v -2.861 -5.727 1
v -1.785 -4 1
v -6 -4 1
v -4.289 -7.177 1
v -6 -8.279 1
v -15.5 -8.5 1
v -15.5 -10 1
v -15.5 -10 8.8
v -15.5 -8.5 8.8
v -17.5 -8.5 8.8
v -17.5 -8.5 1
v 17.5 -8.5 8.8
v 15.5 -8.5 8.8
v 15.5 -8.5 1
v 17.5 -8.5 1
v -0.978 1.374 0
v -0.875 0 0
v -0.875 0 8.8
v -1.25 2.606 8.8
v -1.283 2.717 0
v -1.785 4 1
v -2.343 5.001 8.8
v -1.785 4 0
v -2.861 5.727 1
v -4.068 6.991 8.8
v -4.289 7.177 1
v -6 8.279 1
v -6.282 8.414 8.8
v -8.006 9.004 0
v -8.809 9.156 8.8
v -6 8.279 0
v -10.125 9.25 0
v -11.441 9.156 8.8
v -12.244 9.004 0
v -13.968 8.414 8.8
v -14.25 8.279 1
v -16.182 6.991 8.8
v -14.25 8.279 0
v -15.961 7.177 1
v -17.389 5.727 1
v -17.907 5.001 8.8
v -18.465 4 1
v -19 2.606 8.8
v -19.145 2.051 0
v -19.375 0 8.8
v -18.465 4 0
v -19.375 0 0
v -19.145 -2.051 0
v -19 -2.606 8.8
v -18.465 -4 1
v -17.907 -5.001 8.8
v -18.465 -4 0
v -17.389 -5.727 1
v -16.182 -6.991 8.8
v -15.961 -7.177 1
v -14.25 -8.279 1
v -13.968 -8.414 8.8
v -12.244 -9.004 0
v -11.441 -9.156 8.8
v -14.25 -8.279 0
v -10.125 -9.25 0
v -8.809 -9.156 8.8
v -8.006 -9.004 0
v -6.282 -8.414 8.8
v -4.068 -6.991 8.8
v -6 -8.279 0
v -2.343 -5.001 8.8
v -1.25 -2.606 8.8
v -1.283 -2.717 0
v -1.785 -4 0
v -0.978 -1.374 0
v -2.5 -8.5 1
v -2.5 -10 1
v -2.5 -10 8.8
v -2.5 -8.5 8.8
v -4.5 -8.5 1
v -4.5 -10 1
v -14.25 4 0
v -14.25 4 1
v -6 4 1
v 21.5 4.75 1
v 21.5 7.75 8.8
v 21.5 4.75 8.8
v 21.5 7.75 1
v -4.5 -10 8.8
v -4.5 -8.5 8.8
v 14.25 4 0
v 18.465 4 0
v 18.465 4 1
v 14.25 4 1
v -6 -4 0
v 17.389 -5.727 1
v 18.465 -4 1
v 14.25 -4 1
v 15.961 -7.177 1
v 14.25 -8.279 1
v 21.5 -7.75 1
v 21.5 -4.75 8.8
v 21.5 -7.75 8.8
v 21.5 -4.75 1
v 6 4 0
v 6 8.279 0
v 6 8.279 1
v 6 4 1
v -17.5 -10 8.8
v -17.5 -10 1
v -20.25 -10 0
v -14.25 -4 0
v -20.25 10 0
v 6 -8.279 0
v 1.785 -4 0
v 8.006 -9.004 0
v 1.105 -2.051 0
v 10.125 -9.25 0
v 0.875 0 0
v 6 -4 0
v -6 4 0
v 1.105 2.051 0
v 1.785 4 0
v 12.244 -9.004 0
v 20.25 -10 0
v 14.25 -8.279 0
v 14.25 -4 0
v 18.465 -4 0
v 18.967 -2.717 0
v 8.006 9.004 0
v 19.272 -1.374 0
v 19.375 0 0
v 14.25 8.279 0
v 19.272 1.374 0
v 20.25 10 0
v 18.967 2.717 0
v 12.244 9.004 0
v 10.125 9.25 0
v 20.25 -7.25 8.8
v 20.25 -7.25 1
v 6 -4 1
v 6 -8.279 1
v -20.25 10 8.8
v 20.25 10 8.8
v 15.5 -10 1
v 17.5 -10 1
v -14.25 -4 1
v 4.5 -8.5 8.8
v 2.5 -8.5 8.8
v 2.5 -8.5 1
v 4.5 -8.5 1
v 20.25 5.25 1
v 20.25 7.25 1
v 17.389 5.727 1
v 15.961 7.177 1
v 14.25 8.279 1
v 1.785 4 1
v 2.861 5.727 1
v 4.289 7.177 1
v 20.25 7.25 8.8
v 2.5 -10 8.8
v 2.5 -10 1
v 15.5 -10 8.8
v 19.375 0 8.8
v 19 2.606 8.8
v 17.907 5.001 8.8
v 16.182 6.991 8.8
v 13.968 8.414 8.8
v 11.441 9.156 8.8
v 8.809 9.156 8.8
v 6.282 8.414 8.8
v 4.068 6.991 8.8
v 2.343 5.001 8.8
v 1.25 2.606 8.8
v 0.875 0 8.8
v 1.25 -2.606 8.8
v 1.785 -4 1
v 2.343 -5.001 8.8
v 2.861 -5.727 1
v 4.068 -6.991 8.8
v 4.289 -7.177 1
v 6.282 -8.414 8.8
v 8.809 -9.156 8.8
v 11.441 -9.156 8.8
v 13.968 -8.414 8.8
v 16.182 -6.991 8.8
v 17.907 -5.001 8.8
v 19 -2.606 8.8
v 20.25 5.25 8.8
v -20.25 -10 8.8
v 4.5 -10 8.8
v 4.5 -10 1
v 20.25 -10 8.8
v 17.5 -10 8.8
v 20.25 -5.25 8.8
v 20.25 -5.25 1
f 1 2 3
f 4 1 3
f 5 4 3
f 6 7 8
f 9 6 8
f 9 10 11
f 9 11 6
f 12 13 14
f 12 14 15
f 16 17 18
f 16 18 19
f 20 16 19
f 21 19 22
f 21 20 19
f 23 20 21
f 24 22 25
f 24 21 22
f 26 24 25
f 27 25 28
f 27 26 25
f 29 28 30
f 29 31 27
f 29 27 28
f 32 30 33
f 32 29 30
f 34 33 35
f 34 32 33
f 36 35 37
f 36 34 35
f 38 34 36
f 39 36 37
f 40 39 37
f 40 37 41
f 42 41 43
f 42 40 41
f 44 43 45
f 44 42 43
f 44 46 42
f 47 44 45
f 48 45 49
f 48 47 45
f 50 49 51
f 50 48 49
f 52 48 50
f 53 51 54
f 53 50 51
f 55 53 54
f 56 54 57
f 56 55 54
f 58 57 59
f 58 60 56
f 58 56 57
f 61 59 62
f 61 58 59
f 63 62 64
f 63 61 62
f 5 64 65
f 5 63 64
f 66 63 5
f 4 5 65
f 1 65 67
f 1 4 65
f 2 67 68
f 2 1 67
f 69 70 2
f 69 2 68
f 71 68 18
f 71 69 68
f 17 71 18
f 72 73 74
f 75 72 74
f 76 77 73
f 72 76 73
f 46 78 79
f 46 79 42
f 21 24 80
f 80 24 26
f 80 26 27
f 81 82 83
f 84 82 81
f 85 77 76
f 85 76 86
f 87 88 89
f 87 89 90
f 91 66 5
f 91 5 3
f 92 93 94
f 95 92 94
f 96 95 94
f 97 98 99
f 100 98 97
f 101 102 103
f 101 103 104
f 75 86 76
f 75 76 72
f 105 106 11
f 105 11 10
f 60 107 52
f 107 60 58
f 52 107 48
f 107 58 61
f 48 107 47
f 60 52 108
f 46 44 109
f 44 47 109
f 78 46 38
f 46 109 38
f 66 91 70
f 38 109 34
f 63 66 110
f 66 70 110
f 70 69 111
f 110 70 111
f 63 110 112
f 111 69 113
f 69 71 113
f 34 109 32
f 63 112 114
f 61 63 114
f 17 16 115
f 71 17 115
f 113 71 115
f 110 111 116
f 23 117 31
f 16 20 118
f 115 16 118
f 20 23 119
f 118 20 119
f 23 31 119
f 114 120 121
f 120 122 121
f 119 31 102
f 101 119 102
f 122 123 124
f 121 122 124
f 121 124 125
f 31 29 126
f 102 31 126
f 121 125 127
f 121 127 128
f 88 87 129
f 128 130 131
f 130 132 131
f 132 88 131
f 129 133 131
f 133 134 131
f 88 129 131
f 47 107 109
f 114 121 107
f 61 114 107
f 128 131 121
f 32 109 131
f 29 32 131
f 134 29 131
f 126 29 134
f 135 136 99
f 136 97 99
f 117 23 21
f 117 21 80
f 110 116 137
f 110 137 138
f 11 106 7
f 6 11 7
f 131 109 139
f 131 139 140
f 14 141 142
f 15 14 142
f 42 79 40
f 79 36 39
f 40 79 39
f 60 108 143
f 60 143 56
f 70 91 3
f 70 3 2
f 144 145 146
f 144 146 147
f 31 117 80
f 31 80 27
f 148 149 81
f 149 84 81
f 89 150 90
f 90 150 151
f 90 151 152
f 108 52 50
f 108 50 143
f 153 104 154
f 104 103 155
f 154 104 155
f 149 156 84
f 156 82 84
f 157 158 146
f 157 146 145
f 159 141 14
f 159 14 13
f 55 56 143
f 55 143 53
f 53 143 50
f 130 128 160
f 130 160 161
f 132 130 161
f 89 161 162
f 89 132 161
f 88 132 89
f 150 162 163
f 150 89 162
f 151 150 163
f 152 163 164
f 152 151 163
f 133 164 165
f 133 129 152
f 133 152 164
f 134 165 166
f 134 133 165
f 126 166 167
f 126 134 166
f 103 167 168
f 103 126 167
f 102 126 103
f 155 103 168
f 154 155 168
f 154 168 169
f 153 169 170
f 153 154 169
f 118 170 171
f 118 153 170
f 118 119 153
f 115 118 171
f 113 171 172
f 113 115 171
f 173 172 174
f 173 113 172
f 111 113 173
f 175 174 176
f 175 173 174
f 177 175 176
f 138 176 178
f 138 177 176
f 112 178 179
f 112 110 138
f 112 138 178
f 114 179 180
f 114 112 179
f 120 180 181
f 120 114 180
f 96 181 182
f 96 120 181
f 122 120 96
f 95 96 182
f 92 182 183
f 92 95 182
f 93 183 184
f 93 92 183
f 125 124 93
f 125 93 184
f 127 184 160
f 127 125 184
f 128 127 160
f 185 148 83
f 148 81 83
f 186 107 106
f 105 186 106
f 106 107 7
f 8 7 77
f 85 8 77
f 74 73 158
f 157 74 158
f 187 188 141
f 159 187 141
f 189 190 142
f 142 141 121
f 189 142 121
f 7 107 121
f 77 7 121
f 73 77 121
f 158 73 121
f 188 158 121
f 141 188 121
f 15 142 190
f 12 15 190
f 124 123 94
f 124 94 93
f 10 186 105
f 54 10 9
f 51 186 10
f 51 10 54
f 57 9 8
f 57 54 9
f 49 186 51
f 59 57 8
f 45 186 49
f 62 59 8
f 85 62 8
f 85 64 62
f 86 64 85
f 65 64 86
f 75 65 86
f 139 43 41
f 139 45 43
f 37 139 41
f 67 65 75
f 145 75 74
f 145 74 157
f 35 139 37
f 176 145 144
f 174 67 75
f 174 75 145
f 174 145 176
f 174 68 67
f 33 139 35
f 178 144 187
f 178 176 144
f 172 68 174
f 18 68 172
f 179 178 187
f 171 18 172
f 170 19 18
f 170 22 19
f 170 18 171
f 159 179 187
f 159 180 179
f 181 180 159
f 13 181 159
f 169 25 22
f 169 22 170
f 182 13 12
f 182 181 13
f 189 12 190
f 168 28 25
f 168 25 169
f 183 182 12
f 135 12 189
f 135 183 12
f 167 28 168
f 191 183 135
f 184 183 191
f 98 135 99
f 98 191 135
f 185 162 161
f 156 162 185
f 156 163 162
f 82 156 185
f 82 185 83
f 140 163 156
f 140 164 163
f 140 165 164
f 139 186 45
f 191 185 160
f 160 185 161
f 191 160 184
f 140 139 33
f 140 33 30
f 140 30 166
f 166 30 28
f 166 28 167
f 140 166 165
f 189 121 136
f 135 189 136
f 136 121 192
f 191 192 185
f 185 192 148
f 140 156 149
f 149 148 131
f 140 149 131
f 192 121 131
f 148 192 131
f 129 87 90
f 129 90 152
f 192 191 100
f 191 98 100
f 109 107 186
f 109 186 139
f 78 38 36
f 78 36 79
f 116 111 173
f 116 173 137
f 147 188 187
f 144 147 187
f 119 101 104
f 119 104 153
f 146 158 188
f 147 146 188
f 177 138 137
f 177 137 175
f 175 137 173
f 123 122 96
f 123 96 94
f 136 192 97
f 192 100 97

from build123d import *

# Parameters (mm, degrees)
SKETCH1_W           = 40.5
SKETCH1_H           = 20
SKETCH1_R           = 9.25
BOSS_EXTRUDE1_DEPTH = 8.8
SKETCH2_W           = 2
SKETCH2_H           = 7.8
CUT_EXTRUDE1_DEPTH  = 1.5
BOSS_EXTRUDE2_DEPTH = 1


with BuildPart() as part:
    # Sketch1 → Boss-Extrude1 (new body)
    with BuildSketch(Plane.XY):
        Rectangle(SKETCH1_W, SKETCH1_H)
        with Locations((-10.125, 0)):
            Circle(SKETCH1_R, mode=Mode.SUBTRACT)
        with Locations((10.125, 0)):
            Circle(SKETCH1_R, mode=Mode.SUBTRACT)
    extrude(amount=BOSS_EXTRUDE1_DEPTH)

    # Sketch2 → Cut-Extrude1 (cut)
    with BuildSketch(Plane.XZ.offset(10)):
        with Locations((-16.5, 4.9)):
            Rectangle(SKETCH2_W, SKETCH2_H)
        with Locations((-3.5, 4.9)):
            Rectangle(SKETCH2_W, SKETCH2_H)
        with Locations((3.5, 4.9)):
            Rectangle(SKETCH2_W, SKETCH2_H)
        with Locations((16.5, 4.9)):
            Rectangle(SKETCH2_W, SKETCH2_H)
    extrude(amount=-CUT_EXTRUDE1_DEPTH, mode=Mode.SUBTRACT)

    # Sketch3 → Boss-Extrude2 (add)
    with BuildSketch(Plane(origin=(0, 0, 0), x_dir=(-1, 0, 0), z_dir=(0, 0, -1))):
        with BuildLine():
            Line((-14.25, 4), (-14.25, 8.279304017))
            ThreePointArc((-14.25, 8.279304017), (-16.714745453, 6.491360016), (-18.465413659, 4))
            Line((-18.465413659, 4), (-14.25, 4))
        make_face()
        with BuildLine():
            Line((-6, 4), (-1.784586341, 4))
            ThreePointArc((-1.784586341, 4), (-3.535254547, 6.491360016), (-6, 8.279304017))
            Line((-6, 8.279304017), (-6, 4))
        make_face()
        with BuildLine():
            ThreePointArc((-6, -8.279304017), (-3.535254547, -6.491360016), (-1.784586341, -4))
            Line((-1.784586341, -4), (-6, -4))
            Line((-6, -4), (-6, -8.279304017))
        make_face()
        with BuildLine():
            Line((-14.25, -4), (-18.465413659, -4))
            ThreePointArc((-18.465413659, -4), (-16.714745453, -6.491360016), (-14.25, -8.279304017))
            Line((-14.25, -8.279304017), (-14.25, -4))
        make_face()
        with BuildLine():
            Line((1.784586341, 4), (6, 4))
            Line((6, 4), (6, 8.279304017))
            ThreePointArc((6, 8.279304017), (3.535254547, 6.491360016), (1.784586341, 4))
        make_face()
        with BuildLine():
            ThreePointArc((18.465413659, 4), (16.714745453, 6.491360016), (14.25, 8.279304017))
            Line((14.25, 8.279304017), (14.25, 4))
            Line((14.25, 4), (18.465413659, 4))
        make_face()
        with BuildLine():
            Line((14.25, -4), (14.25, -8.279304017))
            ThreePointArc((14.25, -8.279304017), (16.714745453, -6.491360016), (18.465413659, -4))
            Line((18.465413659, -4), (14.25, -4))
        make_face()
        with BuildLine():
            Line((6, -4), (1.784586341, -4))
            ThreePointArc((1.784586341, -4), (3.535254547, -6.491360016), (6, -8.279304017))
            Line((6, -8.279304017), (6, -4))
        make_face()
    extrude(amount=-BOSS_EXTRUDE2_DEPTH)

    # Sketch4 → Loft1 section 0
    with BuildSketch(Plane(origin=(20.25, 0, 0), x_dir=(0, 0, -1), z_dir=(1, 0, 0))):
        with BuildLine():
            Line((-8.8, 7.25), (-1, 7.25))
            Line((-1, 7.25), (-1, 5.25))
            Line((-1, 5.25), (-8.8, 5.25))
            Line((-8.8, 5.25), (-8.8, 7.25))
        make_face()
    # Sketch5 → Loft1 section 1
    with BuildSketch(Plane(origin=(21.5, 0, 0), x_dir=(0, 0, -1), z_dir=(1, 0, 0))):
        with BuildLine():
            Line((-8.8, 7.75), (-1, 7.75))
            Line((-1, 7.75), (-1, 4.75))
            Line((-1, 4.75), (-8.8, 4.75))
            Line((-8.8, 4.75), (-8.8, 7.75))
        make_face()
    loft()

    # Sketch4<3> → Loft2 section 0
    with BuildSketch(Plane(origin=(20.25, 0, 0), x_dir=(0, 0, -1), z_dir=(1, 0, 0))):
        with BuildLine():
            Line((-8.8, -5.25), (-1, -5.25))
            Line((-1, -5.25), (-1, -7.25))
            Line((-1, -7.25), (-8.8, -7.25))
            Line((-8.8, -7.25), (-8.8, -5.25))
        make_face()
    # Sketch5<3> → Loft2 section 1
    with BuildSketch(Plane(origin=(21.5, 0, 0), x_dir=(0, 0, -1), z_dir=(1, 0, 0))):
        with BuildLine():
            Line((-8.8, -4.75), (-1, -4.75))
            Line((-1, -4.75), (-1, -7.75))
            Line((-1, -7.75), (-8.8, -7.75))
            Line((-8.8, -7.75), (-8.8, -4.75))
        make_face()
    loft()


solid = part.part
